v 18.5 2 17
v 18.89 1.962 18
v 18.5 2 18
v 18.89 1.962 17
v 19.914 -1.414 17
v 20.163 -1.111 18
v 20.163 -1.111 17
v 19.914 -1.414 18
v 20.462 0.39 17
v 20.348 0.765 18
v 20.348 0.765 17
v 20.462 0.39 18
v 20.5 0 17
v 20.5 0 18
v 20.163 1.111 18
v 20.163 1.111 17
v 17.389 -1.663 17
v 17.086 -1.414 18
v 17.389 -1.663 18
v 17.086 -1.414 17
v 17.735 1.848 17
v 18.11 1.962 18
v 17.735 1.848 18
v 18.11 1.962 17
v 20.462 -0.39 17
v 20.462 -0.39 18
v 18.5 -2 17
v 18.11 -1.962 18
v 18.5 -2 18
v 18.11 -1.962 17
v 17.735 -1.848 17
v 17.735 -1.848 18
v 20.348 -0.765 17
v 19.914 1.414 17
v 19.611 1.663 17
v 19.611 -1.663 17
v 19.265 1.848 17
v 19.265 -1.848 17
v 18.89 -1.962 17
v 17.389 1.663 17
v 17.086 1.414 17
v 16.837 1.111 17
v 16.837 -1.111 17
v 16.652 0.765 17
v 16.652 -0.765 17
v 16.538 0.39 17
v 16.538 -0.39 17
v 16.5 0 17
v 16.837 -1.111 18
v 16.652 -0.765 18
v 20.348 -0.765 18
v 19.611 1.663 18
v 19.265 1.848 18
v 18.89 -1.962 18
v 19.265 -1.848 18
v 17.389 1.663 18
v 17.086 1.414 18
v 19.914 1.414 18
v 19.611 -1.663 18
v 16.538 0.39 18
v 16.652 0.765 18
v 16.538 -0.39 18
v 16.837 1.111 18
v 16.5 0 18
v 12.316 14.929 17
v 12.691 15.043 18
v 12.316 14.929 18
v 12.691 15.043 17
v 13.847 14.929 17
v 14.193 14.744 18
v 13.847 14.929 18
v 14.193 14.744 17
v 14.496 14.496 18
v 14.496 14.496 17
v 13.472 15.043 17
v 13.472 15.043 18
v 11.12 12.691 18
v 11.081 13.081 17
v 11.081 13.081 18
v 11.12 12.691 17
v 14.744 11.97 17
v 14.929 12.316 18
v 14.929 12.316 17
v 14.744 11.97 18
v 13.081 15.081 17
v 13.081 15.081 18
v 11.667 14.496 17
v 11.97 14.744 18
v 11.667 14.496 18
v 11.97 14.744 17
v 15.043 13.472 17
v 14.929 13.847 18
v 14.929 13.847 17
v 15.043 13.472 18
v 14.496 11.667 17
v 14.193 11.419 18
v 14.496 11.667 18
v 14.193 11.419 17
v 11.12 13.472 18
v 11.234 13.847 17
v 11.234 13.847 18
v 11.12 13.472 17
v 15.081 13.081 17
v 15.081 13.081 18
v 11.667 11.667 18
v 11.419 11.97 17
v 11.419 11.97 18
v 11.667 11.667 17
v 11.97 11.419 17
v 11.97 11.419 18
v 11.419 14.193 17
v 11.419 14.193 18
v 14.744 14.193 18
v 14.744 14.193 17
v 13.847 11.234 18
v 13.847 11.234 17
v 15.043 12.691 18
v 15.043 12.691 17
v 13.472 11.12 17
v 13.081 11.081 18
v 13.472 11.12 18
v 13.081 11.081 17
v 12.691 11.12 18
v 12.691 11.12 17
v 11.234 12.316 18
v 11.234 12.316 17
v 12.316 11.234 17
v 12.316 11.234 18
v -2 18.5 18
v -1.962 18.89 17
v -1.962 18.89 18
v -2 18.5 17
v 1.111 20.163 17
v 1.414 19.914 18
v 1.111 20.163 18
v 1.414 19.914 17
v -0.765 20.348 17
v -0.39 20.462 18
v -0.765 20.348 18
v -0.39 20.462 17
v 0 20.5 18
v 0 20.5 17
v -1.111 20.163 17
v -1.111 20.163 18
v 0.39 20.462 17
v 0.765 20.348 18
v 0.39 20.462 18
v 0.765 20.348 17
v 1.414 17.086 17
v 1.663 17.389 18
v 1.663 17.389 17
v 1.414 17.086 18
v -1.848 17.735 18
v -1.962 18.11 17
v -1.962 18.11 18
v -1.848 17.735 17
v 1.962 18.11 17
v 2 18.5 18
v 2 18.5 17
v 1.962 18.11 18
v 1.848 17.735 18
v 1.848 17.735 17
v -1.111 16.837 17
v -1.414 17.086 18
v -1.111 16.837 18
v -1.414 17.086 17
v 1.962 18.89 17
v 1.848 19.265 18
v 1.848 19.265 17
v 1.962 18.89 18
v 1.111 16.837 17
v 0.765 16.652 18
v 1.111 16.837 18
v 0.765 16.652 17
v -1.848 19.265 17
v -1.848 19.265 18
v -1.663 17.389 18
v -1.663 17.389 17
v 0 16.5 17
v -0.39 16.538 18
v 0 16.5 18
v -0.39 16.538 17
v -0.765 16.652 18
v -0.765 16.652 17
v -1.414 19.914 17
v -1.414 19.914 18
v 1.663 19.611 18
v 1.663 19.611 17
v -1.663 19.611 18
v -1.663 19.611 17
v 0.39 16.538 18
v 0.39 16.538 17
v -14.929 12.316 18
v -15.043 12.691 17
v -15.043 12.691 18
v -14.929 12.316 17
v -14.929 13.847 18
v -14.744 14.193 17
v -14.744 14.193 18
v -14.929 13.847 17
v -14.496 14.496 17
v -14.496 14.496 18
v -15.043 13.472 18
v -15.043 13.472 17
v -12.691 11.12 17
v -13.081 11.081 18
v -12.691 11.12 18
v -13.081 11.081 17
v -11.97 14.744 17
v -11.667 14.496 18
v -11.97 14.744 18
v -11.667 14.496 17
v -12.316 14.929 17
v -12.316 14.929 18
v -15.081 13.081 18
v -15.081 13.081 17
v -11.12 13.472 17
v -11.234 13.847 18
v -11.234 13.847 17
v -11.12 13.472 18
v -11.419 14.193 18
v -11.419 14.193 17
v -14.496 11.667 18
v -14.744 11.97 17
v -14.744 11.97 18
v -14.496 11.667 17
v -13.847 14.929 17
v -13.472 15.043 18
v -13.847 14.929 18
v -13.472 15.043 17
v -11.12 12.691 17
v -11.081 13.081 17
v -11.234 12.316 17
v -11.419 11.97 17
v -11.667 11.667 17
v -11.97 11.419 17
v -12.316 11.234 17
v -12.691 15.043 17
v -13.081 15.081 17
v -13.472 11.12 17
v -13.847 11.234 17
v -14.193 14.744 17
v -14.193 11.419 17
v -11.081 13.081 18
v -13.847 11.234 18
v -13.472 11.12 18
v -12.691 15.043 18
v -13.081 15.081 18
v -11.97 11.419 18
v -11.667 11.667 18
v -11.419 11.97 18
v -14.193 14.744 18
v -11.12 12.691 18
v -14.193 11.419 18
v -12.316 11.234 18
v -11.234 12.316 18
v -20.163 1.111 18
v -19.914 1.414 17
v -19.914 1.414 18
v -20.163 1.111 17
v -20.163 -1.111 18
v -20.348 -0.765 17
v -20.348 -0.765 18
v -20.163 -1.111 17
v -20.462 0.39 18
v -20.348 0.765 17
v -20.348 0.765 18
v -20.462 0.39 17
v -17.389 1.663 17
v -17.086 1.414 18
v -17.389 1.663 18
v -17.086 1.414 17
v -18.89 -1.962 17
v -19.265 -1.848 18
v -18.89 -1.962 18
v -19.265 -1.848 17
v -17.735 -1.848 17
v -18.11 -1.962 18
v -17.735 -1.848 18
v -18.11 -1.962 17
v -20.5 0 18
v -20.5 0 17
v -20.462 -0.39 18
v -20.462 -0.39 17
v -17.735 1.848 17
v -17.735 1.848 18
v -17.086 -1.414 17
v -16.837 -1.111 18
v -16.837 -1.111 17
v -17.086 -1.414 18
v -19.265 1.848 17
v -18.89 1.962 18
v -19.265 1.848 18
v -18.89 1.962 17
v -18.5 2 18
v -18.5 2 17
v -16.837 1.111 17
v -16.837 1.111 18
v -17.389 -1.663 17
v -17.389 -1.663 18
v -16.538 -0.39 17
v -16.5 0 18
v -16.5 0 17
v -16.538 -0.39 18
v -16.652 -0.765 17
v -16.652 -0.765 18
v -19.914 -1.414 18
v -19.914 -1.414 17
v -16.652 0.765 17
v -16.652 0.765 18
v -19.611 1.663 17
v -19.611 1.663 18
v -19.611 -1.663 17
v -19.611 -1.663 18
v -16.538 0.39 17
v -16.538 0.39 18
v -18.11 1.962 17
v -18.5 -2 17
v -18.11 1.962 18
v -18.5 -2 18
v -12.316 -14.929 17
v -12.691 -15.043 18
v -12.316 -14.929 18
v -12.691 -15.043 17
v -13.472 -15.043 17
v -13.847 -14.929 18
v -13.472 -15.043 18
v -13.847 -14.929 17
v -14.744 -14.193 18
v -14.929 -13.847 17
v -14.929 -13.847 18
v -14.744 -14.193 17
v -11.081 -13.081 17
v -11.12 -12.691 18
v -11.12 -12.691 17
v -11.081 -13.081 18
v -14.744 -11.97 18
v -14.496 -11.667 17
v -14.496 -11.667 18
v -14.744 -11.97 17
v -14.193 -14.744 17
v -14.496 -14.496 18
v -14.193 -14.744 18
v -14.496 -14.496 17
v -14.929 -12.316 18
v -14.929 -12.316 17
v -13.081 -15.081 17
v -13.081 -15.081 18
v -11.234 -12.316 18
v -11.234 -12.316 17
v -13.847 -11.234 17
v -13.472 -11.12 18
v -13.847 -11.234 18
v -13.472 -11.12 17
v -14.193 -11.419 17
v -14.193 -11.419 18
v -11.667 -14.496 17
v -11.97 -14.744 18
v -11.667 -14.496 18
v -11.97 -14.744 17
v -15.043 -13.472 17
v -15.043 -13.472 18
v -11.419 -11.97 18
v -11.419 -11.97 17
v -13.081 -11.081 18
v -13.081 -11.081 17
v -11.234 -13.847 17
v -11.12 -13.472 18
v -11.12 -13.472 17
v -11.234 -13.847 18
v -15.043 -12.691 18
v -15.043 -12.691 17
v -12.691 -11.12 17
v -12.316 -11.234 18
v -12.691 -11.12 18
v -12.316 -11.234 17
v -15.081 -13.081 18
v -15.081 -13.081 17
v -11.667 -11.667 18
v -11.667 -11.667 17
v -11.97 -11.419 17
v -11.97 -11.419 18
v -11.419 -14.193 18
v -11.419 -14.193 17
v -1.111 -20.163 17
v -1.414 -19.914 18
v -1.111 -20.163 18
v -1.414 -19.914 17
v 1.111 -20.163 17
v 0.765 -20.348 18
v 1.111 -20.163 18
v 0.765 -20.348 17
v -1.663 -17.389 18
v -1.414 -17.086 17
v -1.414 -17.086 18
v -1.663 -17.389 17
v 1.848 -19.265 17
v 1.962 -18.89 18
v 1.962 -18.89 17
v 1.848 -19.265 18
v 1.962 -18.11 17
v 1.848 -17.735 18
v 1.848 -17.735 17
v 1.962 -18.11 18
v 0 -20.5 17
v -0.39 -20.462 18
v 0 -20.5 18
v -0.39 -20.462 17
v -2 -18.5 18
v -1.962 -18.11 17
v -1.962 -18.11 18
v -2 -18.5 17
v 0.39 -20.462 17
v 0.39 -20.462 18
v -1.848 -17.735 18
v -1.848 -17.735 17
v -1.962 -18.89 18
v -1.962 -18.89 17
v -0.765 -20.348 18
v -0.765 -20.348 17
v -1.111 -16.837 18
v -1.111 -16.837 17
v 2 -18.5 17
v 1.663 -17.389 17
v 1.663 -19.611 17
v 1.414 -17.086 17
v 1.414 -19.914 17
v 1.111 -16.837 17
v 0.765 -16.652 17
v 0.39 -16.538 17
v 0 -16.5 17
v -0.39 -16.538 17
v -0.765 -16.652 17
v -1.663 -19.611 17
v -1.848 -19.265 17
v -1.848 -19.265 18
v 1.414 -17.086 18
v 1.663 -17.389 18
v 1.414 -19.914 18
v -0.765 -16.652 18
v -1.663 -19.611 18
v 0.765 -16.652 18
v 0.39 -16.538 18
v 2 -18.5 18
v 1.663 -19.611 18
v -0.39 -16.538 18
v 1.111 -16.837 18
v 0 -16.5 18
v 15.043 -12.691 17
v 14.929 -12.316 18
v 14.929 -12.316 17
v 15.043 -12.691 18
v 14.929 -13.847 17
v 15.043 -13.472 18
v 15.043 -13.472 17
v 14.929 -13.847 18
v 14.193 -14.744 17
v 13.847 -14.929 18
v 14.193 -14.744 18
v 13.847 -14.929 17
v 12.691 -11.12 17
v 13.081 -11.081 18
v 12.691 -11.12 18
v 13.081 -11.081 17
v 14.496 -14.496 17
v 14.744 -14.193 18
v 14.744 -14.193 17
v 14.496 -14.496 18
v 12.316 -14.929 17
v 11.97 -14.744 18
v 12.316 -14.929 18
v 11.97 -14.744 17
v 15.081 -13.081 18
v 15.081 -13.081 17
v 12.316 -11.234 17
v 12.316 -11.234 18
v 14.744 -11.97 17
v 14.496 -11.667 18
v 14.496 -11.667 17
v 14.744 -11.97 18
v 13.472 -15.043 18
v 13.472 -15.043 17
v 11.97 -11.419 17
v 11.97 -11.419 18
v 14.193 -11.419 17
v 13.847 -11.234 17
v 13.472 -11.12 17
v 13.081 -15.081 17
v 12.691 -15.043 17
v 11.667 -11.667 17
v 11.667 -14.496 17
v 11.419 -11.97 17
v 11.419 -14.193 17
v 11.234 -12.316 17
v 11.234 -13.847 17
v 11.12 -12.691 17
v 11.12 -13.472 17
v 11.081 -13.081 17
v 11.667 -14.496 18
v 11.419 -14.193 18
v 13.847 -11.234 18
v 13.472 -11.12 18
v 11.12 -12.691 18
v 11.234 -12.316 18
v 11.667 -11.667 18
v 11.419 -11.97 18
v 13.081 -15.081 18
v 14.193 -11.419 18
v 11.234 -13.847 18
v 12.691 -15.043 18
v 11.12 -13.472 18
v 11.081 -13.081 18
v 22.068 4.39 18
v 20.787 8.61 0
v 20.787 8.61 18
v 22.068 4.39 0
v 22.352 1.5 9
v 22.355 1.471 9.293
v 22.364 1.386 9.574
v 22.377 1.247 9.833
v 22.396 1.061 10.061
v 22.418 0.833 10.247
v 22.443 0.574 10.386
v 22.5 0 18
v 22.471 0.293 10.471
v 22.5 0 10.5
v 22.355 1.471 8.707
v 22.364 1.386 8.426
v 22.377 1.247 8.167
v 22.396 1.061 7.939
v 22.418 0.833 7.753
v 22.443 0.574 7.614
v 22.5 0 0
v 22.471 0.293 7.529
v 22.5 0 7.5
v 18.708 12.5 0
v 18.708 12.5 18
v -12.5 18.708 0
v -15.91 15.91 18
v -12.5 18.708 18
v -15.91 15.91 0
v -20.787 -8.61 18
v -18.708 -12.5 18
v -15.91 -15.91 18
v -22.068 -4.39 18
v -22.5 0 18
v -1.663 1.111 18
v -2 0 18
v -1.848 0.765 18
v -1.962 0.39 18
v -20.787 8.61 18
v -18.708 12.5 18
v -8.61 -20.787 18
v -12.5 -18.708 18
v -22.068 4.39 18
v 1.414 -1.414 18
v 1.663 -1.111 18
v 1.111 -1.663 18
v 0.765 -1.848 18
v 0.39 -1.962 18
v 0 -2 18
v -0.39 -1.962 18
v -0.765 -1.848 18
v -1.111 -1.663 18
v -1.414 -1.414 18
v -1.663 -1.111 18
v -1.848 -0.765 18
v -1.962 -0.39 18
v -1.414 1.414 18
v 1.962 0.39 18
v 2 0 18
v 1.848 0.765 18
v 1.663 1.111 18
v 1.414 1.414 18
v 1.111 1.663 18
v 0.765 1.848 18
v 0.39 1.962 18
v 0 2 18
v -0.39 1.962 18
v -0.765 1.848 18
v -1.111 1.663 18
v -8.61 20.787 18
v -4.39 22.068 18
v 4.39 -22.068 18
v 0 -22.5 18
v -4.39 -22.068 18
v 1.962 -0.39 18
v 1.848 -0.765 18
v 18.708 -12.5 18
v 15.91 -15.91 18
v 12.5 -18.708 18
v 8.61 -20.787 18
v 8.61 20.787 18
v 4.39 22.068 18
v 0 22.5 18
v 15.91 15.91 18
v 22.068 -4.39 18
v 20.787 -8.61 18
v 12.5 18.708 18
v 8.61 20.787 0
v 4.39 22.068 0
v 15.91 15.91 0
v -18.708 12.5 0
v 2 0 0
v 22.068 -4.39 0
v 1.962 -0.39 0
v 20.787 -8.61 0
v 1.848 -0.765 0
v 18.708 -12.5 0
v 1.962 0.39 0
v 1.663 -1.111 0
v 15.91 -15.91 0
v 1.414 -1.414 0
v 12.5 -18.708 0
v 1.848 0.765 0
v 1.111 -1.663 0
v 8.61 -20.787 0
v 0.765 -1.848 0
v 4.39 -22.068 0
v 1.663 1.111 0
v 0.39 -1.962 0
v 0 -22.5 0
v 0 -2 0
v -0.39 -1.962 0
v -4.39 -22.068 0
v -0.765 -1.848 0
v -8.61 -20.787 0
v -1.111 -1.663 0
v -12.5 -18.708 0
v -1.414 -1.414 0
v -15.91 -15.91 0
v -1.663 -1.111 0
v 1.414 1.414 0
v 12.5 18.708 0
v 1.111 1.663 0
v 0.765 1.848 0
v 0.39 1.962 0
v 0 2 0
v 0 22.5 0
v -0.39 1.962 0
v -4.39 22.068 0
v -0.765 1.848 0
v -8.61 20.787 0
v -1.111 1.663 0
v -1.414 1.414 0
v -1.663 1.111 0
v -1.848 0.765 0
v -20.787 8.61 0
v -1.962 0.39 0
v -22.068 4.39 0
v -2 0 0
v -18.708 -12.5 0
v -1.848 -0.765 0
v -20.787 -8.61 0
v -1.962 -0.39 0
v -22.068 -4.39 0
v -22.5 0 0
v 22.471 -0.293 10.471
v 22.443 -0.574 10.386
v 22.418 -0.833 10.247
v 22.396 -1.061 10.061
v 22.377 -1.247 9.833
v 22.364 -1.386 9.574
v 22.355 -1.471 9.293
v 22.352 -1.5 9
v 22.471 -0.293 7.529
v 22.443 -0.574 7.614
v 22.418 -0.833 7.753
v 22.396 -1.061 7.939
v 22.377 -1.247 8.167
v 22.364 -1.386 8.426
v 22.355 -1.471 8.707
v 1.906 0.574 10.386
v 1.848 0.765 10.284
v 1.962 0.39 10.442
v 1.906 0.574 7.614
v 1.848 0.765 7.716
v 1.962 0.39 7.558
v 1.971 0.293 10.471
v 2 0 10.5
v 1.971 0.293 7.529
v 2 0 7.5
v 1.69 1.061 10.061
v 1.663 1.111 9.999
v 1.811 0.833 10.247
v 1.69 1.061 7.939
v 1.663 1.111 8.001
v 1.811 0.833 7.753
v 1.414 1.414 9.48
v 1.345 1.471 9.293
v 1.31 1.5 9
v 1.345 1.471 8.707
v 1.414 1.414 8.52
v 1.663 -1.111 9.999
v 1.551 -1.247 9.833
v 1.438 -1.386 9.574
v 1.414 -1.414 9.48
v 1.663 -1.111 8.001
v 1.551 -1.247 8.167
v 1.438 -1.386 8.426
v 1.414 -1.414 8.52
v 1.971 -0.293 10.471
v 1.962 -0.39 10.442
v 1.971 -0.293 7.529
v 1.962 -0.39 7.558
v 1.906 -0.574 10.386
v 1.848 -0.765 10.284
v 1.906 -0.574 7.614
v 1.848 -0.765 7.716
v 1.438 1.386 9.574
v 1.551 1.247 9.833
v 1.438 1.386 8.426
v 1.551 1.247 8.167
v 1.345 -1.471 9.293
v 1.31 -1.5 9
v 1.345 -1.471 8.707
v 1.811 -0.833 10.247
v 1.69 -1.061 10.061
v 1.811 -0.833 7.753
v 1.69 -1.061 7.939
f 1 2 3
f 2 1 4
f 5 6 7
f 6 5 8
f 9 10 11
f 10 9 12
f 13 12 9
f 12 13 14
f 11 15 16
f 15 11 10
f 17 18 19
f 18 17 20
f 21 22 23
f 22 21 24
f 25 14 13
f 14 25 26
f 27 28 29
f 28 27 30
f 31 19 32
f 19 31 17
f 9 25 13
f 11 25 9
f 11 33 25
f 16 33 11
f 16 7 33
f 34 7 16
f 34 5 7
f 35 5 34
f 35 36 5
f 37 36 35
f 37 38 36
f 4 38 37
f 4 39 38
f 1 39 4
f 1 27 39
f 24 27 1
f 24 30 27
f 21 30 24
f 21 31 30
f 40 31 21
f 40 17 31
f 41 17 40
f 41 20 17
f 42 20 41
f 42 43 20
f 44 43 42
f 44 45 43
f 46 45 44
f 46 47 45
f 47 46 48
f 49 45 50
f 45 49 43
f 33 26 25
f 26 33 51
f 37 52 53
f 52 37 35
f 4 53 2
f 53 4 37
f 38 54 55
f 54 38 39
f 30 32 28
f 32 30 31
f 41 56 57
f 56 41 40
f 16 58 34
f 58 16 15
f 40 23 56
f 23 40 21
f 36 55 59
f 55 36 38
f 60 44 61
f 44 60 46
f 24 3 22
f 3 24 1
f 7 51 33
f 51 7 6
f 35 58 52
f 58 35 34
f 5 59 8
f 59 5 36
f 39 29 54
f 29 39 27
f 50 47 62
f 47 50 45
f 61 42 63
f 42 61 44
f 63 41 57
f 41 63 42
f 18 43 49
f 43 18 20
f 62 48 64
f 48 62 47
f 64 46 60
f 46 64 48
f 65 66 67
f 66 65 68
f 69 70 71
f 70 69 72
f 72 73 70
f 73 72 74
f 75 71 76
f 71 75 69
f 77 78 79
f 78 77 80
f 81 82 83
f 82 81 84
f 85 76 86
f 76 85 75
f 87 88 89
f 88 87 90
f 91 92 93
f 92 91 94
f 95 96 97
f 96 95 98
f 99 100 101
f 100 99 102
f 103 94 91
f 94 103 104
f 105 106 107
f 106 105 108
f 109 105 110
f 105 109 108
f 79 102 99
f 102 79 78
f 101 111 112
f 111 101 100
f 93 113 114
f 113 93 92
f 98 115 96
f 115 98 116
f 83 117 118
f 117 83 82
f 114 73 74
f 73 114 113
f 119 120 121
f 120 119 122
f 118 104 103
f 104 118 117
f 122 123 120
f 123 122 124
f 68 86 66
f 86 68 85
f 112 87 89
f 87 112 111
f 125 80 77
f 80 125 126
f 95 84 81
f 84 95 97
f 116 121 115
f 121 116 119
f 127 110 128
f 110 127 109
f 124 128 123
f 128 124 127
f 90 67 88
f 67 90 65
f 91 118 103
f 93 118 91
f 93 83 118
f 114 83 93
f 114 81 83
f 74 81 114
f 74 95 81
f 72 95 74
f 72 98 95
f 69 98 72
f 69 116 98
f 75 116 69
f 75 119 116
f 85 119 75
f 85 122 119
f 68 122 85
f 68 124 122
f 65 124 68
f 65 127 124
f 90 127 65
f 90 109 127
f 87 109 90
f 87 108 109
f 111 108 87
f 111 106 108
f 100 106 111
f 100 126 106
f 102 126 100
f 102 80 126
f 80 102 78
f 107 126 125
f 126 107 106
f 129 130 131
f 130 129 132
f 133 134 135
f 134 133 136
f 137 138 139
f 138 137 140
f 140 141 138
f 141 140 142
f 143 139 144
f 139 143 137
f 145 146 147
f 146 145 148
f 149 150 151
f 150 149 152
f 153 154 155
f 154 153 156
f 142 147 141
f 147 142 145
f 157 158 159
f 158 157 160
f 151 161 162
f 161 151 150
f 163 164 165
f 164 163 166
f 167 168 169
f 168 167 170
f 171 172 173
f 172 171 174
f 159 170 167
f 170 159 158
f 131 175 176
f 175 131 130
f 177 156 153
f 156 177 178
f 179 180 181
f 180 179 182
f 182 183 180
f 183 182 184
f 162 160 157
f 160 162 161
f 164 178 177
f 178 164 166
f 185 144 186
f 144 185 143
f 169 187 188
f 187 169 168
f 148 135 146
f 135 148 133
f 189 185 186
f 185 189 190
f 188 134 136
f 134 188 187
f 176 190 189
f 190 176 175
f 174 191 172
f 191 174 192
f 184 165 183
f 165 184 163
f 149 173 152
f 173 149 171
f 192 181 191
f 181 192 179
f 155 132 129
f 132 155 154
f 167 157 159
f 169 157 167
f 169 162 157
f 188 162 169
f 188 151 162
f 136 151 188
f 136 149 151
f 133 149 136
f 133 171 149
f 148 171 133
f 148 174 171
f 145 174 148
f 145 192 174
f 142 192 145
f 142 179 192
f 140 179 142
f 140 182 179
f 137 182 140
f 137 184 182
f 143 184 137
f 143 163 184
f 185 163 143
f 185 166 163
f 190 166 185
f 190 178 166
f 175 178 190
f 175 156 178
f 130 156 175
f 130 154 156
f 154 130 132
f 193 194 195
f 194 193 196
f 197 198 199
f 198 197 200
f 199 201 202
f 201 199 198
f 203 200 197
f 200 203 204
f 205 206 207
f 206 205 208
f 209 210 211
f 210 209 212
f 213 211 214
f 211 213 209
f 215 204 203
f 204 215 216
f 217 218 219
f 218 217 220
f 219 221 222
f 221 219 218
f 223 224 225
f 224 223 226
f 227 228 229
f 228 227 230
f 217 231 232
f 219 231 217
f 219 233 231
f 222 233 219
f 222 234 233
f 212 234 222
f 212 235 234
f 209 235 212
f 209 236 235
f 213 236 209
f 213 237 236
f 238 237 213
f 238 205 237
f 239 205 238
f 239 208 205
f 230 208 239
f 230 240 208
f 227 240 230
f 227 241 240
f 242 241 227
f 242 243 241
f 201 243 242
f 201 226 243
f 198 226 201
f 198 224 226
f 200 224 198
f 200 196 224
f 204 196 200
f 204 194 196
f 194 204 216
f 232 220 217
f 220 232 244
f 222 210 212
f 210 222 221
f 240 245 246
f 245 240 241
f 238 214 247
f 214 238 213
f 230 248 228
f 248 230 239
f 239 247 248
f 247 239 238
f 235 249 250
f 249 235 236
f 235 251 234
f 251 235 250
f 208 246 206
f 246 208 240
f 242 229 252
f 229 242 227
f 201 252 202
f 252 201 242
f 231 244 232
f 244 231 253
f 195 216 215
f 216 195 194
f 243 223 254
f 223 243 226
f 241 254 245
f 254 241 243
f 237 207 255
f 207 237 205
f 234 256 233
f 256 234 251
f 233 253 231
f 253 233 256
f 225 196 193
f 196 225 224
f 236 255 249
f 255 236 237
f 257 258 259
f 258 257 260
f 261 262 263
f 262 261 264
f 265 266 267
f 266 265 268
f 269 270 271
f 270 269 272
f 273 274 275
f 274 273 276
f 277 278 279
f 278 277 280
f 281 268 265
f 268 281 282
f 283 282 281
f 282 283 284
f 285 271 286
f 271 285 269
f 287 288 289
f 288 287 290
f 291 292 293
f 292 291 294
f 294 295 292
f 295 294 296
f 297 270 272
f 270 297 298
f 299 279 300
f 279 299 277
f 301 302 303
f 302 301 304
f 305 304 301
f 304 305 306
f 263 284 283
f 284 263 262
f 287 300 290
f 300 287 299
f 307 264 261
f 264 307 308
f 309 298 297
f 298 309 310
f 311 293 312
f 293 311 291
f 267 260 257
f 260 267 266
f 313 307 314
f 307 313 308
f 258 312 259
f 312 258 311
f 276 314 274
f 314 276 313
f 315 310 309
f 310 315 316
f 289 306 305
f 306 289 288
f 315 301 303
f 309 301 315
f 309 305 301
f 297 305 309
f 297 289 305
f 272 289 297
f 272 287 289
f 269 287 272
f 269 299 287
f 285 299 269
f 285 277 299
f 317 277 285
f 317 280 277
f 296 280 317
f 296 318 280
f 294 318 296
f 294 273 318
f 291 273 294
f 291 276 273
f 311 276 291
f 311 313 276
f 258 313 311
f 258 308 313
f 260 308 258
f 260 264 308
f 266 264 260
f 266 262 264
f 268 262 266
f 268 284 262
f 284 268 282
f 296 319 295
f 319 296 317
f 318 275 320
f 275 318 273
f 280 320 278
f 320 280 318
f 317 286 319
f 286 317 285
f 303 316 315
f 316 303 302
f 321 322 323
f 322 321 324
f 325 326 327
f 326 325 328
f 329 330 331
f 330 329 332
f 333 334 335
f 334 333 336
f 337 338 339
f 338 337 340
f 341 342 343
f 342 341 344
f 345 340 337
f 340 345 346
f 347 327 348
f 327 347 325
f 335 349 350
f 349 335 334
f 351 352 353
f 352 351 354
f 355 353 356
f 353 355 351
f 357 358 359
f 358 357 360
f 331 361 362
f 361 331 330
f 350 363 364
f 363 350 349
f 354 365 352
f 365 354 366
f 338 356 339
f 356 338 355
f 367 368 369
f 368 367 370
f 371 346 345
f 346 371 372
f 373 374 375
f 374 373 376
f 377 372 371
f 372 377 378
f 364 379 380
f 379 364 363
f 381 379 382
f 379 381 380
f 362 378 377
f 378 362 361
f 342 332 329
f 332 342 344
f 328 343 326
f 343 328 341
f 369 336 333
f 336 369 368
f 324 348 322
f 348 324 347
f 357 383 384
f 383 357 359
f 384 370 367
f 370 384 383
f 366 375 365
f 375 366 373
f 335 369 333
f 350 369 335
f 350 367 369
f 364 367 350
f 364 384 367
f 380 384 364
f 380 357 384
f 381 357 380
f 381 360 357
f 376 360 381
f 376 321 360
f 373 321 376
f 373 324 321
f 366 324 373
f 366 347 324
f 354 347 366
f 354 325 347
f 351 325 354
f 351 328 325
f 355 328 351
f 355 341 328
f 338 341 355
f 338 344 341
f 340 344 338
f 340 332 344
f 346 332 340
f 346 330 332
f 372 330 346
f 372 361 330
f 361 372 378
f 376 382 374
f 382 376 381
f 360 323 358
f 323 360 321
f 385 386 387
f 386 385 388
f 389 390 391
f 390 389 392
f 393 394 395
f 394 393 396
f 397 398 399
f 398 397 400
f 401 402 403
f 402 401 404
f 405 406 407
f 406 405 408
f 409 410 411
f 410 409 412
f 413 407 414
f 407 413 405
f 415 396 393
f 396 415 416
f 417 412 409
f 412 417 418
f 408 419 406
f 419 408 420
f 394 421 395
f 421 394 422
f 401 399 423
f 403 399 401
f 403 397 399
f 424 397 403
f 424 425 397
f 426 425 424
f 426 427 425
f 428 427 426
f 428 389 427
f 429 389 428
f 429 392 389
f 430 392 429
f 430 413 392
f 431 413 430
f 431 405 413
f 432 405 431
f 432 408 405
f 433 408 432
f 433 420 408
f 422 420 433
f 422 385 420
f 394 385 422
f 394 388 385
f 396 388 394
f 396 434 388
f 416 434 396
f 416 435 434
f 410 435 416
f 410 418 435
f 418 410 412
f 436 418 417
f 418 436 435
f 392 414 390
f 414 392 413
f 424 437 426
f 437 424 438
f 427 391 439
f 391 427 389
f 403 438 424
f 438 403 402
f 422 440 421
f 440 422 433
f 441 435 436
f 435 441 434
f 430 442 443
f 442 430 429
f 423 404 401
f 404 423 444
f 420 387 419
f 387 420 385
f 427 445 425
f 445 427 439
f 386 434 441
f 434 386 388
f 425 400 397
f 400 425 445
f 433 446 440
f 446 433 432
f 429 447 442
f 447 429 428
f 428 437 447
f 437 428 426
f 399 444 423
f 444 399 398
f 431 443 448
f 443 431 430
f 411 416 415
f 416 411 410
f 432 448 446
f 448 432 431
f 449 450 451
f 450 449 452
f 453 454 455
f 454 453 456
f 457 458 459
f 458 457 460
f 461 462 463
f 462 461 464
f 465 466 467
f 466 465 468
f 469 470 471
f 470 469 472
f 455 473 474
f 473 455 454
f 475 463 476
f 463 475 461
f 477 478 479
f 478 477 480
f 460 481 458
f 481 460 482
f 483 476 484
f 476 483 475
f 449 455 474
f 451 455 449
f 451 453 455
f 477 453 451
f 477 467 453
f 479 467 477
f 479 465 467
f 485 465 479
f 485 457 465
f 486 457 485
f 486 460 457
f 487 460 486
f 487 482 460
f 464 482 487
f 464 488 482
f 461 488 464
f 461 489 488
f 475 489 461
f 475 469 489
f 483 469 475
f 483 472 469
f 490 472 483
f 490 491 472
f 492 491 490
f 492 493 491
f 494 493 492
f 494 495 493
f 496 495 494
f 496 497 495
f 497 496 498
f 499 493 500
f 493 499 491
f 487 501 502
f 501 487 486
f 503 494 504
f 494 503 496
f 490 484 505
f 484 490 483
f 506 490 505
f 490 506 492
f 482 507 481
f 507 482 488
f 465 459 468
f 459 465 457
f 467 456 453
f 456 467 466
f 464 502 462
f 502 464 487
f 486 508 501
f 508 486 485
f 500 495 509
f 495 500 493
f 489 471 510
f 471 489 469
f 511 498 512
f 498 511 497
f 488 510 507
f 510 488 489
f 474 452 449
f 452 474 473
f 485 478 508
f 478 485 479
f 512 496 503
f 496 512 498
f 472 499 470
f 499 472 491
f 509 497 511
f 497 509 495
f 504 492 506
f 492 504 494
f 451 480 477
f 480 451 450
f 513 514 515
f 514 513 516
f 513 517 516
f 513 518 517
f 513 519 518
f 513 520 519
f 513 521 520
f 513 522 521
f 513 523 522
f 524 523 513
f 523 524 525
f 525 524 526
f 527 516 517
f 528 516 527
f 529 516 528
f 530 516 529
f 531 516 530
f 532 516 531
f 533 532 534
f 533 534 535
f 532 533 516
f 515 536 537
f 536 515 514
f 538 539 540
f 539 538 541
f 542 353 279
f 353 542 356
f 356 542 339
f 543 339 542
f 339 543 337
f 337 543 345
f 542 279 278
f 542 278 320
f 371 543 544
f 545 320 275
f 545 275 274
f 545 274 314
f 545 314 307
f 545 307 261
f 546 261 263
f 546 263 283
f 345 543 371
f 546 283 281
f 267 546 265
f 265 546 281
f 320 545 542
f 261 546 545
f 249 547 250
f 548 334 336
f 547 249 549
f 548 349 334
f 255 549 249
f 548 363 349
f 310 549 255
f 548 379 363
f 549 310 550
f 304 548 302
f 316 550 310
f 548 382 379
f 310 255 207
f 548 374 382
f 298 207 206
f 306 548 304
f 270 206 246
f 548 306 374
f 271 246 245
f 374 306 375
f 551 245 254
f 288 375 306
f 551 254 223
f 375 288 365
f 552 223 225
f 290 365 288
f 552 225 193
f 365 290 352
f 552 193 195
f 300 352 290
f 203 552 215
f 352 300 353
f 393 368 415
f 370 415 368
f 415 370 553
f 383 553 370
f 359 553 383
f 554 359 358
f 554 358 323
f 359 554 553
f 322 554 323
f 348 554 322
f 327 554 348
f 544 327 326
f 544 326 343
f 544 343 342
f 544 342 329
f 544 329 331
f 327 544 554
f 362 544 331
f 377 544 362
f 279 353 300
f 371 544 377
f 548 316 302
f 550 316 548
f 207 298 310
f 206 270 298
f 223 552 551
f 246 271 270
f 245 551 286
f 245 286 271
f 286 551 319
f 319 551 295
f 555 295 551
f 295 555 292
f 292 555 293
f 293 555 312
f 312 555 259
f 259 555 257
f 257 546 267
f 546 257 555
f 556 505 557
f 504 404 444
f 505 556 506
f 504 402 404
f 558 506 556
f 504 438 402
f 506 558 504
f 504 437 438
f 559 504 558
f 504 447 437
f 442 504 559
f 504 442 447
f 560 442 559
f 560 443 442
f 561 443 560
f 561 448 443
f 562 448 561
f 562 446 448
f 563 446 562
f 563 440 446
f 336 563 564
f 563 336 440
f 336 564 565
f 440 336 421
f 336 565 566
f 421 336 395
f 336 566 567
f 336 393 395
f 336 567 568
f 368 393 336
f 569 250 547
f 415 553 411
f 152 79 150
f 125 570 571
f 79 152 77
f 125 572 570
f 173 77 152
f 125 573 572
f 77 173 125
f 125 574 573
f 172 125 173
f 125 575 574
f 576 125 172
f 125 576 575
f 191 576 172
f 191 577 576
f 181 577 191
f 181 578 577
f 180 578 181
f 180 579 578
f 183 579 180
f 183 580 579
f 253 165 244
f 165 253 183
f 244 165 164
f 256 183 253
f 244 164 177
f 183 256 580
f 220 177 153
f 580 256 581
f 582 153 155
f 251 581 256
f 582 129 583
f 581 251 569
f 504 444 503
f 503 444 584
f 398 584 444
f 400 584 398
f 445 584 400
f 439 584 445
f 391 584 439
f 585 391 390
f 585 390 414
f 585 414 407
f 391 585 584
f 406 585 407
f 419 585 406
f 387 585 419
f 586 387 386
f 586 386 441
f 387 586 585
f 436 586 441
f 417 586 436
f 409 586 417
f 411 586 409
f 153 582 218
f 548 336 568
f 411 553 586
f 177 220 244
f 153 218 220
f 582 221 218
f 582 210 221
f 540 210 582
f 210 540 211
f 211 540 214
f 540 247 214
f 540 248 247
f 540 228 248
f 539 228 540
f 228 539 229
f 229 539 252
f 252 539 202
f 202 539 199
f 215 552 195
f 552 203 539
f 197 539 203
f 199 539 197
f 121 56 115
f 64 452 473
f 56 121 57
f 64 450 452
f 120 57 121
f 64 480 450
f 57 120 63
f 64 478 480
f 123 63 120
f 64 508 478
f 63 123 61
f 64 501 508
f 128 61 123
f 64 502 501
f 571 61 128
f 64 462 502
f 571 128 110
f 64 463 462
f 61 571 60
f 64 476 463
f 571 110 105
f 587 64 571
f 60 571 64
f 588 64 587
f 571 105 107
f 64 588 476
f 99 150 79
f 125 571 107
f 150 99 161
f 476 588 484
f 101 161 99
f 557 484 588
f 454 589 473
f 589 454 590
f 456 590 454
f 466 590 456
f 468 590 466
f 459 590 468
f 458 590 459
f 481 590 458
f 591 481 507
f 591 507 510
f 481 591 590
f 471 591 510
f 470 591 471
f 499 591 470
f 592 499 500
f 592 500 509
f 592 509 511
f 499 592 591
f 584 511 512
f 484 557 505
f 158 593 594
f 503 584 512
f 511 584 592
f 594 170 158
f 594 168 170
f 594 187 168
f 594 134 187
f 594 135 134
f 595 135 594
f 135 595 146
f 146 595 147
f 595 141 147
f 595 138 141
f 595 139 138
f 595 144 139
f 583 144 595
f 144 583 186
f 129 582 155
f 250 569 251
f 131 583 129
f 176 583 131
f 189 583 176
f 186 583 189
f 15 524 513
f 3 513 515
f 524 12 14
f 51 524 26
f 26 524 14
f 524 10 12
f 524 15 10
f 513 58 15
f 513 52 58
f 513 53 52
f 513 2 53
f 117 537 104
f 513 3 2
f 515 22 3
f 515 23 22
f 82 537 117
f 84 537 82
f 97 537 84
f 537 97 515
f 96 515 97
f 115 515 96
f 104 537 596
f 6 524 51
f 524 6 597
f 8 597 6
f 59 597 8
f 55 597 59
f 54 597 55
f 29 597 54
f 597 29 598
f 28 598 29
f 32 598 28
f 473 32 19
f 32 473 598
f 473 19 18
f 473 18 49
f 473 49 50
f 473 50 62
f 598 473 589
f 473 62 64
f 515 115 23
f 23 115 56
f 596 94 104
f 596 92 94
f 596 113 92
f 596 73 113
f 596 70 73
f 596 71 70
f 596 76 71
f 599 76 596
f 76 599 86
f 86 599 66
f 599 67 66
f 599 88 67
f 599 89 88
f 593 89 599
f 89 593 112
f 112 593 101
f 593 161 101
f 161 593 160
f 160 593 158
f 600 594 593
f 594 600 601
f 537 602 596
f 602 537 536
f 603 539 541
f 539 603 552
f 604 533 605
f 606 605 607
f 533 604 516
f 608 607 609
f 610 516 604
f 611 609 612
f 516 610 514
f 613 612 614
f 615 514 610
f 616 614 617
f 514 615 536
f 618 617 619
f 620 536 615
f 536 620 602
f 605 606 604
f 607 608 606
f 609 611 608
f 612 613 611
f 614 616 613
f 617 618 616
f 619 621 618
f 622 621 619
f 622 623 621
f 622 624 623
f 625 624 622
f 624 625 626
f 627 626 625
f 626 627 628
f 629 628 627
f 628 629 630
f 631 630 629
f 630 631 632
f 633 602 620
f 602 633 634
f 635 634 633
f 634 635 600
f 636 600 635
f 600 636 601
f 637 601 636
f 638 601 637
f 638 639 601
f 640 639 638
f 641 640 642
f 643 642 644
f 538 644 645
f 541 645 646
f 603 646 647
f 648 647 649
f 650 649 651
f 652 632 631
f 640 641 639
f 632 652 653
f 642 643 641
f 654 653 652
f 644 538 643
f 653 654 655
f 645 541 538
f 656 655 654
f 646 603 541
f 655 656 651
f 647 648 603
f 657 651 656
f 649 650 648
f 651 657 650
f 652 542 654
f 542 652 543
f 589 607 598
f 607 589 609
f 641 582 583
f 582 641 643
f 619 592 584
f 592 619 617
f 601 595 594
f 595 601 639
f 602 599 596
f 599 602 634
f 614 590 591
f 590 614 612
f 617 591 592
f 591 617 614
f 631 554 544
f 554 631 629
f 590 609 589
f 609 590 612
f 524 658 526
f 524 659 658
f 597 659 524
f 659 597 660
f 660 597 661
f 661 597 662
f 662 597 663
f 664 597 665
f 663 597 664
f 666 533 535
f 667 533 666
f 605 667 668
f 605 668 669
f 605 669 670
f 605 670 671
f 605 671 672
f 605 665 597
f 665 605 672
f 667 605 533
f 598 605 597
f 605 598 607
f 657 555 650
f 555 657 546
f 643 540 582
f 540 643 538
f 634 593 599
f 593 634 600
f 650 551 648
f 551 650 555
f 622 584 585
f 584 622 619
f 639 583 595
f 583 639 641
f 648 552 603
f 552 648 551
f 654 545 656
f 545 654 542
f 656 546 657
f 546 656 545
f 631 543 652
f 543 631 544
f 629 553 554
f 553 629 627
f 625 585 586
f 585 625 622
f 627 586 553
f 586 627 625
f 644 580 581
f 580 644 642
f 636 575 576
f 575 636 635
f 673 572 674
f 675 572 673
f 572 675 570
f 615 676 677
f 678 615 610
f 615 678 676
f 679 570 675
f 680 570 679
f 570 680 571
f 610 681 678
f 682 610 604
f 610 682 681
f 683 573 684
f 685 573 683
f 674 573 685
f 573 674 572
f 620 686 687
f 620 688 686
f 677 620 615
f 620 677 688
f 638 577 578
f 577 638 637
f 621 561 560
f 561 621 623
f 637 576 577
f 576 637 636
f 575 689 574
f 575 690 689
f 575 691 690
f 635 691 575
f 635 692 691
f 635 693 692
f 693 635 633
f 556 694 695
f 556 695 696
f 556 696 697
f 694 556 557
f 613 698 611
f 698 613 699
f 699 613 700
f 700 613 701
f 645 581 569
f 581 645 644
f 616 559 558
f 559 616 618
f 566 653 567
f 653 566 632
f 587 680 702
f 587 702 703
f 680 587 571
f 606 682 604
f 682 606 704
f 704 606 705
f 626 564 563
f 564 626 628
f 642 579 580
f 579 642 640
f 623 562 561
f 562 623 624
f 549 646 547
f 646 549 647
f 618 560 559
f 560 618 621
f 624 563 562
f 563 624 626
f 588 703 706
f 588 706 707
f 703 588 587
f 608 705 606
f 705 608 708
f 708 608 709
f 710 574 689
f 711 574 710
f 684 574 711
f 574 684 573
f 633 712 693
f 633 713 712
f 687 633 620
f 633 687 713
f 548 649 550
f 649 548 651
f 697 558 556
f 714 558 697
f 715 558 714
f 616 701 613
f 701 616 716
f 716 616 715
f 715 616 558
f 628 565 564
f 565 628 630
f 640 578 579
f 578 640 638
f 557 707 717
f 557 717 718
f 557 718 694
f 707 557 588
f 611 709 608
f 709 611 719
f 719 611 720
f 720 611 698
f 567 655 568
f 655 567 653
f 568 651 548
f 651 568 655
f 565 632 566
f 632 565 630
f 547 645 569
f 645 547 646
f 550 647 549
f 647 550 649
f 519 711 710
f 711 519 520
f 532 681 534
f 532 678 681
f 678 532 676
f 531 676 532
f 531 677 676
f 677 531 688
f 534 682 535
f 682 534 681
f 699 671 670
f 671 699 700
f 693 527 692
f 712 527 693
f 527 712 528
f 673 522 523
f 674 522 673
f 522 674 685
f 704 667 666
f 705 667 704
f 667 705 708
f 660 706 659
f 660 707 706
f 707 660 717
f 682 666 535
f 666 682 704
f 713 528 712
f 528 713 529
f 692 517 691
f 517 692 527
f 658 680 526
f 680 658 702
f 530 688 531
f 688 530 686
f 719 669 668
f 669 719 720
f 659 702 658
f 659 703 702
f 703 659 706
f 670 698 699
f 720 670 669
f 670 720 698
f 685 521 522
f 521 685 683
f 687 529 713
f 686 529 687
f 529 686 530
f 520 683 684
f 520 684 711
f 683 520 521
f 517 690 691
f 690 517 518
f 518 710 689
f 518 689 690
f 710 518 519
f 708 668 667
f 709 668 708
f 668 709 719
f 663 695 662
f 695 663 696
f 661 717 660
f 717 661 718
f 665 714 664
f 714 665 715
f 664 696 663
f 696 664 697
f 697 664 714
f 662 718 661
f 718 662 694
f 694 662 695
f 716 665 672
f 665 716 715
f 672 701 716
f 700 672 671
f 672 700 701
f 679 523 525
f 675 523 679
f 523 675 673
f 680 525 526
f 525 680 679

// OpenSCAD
$fn = 32;

// ----------------------------------------------------------------------
// Control knob: dimpled knob
// ----------------------------------------------------------------------

// --- parameters (mm) ---
dimp_d = 4;               // finger dimple diameter
n_dimp = 8;               // number of dimples
dimp_r = 18.5;            // dimple ring radius
knob_d = 45;              // knob body diameter
knob_h = 18;              // knob body height
bore_d = 4;               // shaft bore diameter
set_d = 3;                // set screw bore diameter

dimp_step = 360 / n_dimp;  // dimple angular step

difference() {
  cylinder(h = knob_h, d = knob_d);
  translate([0, 0, -1]) cylinder(h = knob_h + 2, d = bore_d);
  translate([-1, 0, knob_h / 2]) rotate([0, 90, 0])
    cylinder(h = knob_d / 2 + bore_d / 2 + 2, d = set_d);  for (i = [0 : n_dimp - 1])
    rotate([0, 0, i * dimp_step])
      translate([dimp_r, 0, knob_h - 1])
        cylinder(h = 2, d = dimp_d);
}
